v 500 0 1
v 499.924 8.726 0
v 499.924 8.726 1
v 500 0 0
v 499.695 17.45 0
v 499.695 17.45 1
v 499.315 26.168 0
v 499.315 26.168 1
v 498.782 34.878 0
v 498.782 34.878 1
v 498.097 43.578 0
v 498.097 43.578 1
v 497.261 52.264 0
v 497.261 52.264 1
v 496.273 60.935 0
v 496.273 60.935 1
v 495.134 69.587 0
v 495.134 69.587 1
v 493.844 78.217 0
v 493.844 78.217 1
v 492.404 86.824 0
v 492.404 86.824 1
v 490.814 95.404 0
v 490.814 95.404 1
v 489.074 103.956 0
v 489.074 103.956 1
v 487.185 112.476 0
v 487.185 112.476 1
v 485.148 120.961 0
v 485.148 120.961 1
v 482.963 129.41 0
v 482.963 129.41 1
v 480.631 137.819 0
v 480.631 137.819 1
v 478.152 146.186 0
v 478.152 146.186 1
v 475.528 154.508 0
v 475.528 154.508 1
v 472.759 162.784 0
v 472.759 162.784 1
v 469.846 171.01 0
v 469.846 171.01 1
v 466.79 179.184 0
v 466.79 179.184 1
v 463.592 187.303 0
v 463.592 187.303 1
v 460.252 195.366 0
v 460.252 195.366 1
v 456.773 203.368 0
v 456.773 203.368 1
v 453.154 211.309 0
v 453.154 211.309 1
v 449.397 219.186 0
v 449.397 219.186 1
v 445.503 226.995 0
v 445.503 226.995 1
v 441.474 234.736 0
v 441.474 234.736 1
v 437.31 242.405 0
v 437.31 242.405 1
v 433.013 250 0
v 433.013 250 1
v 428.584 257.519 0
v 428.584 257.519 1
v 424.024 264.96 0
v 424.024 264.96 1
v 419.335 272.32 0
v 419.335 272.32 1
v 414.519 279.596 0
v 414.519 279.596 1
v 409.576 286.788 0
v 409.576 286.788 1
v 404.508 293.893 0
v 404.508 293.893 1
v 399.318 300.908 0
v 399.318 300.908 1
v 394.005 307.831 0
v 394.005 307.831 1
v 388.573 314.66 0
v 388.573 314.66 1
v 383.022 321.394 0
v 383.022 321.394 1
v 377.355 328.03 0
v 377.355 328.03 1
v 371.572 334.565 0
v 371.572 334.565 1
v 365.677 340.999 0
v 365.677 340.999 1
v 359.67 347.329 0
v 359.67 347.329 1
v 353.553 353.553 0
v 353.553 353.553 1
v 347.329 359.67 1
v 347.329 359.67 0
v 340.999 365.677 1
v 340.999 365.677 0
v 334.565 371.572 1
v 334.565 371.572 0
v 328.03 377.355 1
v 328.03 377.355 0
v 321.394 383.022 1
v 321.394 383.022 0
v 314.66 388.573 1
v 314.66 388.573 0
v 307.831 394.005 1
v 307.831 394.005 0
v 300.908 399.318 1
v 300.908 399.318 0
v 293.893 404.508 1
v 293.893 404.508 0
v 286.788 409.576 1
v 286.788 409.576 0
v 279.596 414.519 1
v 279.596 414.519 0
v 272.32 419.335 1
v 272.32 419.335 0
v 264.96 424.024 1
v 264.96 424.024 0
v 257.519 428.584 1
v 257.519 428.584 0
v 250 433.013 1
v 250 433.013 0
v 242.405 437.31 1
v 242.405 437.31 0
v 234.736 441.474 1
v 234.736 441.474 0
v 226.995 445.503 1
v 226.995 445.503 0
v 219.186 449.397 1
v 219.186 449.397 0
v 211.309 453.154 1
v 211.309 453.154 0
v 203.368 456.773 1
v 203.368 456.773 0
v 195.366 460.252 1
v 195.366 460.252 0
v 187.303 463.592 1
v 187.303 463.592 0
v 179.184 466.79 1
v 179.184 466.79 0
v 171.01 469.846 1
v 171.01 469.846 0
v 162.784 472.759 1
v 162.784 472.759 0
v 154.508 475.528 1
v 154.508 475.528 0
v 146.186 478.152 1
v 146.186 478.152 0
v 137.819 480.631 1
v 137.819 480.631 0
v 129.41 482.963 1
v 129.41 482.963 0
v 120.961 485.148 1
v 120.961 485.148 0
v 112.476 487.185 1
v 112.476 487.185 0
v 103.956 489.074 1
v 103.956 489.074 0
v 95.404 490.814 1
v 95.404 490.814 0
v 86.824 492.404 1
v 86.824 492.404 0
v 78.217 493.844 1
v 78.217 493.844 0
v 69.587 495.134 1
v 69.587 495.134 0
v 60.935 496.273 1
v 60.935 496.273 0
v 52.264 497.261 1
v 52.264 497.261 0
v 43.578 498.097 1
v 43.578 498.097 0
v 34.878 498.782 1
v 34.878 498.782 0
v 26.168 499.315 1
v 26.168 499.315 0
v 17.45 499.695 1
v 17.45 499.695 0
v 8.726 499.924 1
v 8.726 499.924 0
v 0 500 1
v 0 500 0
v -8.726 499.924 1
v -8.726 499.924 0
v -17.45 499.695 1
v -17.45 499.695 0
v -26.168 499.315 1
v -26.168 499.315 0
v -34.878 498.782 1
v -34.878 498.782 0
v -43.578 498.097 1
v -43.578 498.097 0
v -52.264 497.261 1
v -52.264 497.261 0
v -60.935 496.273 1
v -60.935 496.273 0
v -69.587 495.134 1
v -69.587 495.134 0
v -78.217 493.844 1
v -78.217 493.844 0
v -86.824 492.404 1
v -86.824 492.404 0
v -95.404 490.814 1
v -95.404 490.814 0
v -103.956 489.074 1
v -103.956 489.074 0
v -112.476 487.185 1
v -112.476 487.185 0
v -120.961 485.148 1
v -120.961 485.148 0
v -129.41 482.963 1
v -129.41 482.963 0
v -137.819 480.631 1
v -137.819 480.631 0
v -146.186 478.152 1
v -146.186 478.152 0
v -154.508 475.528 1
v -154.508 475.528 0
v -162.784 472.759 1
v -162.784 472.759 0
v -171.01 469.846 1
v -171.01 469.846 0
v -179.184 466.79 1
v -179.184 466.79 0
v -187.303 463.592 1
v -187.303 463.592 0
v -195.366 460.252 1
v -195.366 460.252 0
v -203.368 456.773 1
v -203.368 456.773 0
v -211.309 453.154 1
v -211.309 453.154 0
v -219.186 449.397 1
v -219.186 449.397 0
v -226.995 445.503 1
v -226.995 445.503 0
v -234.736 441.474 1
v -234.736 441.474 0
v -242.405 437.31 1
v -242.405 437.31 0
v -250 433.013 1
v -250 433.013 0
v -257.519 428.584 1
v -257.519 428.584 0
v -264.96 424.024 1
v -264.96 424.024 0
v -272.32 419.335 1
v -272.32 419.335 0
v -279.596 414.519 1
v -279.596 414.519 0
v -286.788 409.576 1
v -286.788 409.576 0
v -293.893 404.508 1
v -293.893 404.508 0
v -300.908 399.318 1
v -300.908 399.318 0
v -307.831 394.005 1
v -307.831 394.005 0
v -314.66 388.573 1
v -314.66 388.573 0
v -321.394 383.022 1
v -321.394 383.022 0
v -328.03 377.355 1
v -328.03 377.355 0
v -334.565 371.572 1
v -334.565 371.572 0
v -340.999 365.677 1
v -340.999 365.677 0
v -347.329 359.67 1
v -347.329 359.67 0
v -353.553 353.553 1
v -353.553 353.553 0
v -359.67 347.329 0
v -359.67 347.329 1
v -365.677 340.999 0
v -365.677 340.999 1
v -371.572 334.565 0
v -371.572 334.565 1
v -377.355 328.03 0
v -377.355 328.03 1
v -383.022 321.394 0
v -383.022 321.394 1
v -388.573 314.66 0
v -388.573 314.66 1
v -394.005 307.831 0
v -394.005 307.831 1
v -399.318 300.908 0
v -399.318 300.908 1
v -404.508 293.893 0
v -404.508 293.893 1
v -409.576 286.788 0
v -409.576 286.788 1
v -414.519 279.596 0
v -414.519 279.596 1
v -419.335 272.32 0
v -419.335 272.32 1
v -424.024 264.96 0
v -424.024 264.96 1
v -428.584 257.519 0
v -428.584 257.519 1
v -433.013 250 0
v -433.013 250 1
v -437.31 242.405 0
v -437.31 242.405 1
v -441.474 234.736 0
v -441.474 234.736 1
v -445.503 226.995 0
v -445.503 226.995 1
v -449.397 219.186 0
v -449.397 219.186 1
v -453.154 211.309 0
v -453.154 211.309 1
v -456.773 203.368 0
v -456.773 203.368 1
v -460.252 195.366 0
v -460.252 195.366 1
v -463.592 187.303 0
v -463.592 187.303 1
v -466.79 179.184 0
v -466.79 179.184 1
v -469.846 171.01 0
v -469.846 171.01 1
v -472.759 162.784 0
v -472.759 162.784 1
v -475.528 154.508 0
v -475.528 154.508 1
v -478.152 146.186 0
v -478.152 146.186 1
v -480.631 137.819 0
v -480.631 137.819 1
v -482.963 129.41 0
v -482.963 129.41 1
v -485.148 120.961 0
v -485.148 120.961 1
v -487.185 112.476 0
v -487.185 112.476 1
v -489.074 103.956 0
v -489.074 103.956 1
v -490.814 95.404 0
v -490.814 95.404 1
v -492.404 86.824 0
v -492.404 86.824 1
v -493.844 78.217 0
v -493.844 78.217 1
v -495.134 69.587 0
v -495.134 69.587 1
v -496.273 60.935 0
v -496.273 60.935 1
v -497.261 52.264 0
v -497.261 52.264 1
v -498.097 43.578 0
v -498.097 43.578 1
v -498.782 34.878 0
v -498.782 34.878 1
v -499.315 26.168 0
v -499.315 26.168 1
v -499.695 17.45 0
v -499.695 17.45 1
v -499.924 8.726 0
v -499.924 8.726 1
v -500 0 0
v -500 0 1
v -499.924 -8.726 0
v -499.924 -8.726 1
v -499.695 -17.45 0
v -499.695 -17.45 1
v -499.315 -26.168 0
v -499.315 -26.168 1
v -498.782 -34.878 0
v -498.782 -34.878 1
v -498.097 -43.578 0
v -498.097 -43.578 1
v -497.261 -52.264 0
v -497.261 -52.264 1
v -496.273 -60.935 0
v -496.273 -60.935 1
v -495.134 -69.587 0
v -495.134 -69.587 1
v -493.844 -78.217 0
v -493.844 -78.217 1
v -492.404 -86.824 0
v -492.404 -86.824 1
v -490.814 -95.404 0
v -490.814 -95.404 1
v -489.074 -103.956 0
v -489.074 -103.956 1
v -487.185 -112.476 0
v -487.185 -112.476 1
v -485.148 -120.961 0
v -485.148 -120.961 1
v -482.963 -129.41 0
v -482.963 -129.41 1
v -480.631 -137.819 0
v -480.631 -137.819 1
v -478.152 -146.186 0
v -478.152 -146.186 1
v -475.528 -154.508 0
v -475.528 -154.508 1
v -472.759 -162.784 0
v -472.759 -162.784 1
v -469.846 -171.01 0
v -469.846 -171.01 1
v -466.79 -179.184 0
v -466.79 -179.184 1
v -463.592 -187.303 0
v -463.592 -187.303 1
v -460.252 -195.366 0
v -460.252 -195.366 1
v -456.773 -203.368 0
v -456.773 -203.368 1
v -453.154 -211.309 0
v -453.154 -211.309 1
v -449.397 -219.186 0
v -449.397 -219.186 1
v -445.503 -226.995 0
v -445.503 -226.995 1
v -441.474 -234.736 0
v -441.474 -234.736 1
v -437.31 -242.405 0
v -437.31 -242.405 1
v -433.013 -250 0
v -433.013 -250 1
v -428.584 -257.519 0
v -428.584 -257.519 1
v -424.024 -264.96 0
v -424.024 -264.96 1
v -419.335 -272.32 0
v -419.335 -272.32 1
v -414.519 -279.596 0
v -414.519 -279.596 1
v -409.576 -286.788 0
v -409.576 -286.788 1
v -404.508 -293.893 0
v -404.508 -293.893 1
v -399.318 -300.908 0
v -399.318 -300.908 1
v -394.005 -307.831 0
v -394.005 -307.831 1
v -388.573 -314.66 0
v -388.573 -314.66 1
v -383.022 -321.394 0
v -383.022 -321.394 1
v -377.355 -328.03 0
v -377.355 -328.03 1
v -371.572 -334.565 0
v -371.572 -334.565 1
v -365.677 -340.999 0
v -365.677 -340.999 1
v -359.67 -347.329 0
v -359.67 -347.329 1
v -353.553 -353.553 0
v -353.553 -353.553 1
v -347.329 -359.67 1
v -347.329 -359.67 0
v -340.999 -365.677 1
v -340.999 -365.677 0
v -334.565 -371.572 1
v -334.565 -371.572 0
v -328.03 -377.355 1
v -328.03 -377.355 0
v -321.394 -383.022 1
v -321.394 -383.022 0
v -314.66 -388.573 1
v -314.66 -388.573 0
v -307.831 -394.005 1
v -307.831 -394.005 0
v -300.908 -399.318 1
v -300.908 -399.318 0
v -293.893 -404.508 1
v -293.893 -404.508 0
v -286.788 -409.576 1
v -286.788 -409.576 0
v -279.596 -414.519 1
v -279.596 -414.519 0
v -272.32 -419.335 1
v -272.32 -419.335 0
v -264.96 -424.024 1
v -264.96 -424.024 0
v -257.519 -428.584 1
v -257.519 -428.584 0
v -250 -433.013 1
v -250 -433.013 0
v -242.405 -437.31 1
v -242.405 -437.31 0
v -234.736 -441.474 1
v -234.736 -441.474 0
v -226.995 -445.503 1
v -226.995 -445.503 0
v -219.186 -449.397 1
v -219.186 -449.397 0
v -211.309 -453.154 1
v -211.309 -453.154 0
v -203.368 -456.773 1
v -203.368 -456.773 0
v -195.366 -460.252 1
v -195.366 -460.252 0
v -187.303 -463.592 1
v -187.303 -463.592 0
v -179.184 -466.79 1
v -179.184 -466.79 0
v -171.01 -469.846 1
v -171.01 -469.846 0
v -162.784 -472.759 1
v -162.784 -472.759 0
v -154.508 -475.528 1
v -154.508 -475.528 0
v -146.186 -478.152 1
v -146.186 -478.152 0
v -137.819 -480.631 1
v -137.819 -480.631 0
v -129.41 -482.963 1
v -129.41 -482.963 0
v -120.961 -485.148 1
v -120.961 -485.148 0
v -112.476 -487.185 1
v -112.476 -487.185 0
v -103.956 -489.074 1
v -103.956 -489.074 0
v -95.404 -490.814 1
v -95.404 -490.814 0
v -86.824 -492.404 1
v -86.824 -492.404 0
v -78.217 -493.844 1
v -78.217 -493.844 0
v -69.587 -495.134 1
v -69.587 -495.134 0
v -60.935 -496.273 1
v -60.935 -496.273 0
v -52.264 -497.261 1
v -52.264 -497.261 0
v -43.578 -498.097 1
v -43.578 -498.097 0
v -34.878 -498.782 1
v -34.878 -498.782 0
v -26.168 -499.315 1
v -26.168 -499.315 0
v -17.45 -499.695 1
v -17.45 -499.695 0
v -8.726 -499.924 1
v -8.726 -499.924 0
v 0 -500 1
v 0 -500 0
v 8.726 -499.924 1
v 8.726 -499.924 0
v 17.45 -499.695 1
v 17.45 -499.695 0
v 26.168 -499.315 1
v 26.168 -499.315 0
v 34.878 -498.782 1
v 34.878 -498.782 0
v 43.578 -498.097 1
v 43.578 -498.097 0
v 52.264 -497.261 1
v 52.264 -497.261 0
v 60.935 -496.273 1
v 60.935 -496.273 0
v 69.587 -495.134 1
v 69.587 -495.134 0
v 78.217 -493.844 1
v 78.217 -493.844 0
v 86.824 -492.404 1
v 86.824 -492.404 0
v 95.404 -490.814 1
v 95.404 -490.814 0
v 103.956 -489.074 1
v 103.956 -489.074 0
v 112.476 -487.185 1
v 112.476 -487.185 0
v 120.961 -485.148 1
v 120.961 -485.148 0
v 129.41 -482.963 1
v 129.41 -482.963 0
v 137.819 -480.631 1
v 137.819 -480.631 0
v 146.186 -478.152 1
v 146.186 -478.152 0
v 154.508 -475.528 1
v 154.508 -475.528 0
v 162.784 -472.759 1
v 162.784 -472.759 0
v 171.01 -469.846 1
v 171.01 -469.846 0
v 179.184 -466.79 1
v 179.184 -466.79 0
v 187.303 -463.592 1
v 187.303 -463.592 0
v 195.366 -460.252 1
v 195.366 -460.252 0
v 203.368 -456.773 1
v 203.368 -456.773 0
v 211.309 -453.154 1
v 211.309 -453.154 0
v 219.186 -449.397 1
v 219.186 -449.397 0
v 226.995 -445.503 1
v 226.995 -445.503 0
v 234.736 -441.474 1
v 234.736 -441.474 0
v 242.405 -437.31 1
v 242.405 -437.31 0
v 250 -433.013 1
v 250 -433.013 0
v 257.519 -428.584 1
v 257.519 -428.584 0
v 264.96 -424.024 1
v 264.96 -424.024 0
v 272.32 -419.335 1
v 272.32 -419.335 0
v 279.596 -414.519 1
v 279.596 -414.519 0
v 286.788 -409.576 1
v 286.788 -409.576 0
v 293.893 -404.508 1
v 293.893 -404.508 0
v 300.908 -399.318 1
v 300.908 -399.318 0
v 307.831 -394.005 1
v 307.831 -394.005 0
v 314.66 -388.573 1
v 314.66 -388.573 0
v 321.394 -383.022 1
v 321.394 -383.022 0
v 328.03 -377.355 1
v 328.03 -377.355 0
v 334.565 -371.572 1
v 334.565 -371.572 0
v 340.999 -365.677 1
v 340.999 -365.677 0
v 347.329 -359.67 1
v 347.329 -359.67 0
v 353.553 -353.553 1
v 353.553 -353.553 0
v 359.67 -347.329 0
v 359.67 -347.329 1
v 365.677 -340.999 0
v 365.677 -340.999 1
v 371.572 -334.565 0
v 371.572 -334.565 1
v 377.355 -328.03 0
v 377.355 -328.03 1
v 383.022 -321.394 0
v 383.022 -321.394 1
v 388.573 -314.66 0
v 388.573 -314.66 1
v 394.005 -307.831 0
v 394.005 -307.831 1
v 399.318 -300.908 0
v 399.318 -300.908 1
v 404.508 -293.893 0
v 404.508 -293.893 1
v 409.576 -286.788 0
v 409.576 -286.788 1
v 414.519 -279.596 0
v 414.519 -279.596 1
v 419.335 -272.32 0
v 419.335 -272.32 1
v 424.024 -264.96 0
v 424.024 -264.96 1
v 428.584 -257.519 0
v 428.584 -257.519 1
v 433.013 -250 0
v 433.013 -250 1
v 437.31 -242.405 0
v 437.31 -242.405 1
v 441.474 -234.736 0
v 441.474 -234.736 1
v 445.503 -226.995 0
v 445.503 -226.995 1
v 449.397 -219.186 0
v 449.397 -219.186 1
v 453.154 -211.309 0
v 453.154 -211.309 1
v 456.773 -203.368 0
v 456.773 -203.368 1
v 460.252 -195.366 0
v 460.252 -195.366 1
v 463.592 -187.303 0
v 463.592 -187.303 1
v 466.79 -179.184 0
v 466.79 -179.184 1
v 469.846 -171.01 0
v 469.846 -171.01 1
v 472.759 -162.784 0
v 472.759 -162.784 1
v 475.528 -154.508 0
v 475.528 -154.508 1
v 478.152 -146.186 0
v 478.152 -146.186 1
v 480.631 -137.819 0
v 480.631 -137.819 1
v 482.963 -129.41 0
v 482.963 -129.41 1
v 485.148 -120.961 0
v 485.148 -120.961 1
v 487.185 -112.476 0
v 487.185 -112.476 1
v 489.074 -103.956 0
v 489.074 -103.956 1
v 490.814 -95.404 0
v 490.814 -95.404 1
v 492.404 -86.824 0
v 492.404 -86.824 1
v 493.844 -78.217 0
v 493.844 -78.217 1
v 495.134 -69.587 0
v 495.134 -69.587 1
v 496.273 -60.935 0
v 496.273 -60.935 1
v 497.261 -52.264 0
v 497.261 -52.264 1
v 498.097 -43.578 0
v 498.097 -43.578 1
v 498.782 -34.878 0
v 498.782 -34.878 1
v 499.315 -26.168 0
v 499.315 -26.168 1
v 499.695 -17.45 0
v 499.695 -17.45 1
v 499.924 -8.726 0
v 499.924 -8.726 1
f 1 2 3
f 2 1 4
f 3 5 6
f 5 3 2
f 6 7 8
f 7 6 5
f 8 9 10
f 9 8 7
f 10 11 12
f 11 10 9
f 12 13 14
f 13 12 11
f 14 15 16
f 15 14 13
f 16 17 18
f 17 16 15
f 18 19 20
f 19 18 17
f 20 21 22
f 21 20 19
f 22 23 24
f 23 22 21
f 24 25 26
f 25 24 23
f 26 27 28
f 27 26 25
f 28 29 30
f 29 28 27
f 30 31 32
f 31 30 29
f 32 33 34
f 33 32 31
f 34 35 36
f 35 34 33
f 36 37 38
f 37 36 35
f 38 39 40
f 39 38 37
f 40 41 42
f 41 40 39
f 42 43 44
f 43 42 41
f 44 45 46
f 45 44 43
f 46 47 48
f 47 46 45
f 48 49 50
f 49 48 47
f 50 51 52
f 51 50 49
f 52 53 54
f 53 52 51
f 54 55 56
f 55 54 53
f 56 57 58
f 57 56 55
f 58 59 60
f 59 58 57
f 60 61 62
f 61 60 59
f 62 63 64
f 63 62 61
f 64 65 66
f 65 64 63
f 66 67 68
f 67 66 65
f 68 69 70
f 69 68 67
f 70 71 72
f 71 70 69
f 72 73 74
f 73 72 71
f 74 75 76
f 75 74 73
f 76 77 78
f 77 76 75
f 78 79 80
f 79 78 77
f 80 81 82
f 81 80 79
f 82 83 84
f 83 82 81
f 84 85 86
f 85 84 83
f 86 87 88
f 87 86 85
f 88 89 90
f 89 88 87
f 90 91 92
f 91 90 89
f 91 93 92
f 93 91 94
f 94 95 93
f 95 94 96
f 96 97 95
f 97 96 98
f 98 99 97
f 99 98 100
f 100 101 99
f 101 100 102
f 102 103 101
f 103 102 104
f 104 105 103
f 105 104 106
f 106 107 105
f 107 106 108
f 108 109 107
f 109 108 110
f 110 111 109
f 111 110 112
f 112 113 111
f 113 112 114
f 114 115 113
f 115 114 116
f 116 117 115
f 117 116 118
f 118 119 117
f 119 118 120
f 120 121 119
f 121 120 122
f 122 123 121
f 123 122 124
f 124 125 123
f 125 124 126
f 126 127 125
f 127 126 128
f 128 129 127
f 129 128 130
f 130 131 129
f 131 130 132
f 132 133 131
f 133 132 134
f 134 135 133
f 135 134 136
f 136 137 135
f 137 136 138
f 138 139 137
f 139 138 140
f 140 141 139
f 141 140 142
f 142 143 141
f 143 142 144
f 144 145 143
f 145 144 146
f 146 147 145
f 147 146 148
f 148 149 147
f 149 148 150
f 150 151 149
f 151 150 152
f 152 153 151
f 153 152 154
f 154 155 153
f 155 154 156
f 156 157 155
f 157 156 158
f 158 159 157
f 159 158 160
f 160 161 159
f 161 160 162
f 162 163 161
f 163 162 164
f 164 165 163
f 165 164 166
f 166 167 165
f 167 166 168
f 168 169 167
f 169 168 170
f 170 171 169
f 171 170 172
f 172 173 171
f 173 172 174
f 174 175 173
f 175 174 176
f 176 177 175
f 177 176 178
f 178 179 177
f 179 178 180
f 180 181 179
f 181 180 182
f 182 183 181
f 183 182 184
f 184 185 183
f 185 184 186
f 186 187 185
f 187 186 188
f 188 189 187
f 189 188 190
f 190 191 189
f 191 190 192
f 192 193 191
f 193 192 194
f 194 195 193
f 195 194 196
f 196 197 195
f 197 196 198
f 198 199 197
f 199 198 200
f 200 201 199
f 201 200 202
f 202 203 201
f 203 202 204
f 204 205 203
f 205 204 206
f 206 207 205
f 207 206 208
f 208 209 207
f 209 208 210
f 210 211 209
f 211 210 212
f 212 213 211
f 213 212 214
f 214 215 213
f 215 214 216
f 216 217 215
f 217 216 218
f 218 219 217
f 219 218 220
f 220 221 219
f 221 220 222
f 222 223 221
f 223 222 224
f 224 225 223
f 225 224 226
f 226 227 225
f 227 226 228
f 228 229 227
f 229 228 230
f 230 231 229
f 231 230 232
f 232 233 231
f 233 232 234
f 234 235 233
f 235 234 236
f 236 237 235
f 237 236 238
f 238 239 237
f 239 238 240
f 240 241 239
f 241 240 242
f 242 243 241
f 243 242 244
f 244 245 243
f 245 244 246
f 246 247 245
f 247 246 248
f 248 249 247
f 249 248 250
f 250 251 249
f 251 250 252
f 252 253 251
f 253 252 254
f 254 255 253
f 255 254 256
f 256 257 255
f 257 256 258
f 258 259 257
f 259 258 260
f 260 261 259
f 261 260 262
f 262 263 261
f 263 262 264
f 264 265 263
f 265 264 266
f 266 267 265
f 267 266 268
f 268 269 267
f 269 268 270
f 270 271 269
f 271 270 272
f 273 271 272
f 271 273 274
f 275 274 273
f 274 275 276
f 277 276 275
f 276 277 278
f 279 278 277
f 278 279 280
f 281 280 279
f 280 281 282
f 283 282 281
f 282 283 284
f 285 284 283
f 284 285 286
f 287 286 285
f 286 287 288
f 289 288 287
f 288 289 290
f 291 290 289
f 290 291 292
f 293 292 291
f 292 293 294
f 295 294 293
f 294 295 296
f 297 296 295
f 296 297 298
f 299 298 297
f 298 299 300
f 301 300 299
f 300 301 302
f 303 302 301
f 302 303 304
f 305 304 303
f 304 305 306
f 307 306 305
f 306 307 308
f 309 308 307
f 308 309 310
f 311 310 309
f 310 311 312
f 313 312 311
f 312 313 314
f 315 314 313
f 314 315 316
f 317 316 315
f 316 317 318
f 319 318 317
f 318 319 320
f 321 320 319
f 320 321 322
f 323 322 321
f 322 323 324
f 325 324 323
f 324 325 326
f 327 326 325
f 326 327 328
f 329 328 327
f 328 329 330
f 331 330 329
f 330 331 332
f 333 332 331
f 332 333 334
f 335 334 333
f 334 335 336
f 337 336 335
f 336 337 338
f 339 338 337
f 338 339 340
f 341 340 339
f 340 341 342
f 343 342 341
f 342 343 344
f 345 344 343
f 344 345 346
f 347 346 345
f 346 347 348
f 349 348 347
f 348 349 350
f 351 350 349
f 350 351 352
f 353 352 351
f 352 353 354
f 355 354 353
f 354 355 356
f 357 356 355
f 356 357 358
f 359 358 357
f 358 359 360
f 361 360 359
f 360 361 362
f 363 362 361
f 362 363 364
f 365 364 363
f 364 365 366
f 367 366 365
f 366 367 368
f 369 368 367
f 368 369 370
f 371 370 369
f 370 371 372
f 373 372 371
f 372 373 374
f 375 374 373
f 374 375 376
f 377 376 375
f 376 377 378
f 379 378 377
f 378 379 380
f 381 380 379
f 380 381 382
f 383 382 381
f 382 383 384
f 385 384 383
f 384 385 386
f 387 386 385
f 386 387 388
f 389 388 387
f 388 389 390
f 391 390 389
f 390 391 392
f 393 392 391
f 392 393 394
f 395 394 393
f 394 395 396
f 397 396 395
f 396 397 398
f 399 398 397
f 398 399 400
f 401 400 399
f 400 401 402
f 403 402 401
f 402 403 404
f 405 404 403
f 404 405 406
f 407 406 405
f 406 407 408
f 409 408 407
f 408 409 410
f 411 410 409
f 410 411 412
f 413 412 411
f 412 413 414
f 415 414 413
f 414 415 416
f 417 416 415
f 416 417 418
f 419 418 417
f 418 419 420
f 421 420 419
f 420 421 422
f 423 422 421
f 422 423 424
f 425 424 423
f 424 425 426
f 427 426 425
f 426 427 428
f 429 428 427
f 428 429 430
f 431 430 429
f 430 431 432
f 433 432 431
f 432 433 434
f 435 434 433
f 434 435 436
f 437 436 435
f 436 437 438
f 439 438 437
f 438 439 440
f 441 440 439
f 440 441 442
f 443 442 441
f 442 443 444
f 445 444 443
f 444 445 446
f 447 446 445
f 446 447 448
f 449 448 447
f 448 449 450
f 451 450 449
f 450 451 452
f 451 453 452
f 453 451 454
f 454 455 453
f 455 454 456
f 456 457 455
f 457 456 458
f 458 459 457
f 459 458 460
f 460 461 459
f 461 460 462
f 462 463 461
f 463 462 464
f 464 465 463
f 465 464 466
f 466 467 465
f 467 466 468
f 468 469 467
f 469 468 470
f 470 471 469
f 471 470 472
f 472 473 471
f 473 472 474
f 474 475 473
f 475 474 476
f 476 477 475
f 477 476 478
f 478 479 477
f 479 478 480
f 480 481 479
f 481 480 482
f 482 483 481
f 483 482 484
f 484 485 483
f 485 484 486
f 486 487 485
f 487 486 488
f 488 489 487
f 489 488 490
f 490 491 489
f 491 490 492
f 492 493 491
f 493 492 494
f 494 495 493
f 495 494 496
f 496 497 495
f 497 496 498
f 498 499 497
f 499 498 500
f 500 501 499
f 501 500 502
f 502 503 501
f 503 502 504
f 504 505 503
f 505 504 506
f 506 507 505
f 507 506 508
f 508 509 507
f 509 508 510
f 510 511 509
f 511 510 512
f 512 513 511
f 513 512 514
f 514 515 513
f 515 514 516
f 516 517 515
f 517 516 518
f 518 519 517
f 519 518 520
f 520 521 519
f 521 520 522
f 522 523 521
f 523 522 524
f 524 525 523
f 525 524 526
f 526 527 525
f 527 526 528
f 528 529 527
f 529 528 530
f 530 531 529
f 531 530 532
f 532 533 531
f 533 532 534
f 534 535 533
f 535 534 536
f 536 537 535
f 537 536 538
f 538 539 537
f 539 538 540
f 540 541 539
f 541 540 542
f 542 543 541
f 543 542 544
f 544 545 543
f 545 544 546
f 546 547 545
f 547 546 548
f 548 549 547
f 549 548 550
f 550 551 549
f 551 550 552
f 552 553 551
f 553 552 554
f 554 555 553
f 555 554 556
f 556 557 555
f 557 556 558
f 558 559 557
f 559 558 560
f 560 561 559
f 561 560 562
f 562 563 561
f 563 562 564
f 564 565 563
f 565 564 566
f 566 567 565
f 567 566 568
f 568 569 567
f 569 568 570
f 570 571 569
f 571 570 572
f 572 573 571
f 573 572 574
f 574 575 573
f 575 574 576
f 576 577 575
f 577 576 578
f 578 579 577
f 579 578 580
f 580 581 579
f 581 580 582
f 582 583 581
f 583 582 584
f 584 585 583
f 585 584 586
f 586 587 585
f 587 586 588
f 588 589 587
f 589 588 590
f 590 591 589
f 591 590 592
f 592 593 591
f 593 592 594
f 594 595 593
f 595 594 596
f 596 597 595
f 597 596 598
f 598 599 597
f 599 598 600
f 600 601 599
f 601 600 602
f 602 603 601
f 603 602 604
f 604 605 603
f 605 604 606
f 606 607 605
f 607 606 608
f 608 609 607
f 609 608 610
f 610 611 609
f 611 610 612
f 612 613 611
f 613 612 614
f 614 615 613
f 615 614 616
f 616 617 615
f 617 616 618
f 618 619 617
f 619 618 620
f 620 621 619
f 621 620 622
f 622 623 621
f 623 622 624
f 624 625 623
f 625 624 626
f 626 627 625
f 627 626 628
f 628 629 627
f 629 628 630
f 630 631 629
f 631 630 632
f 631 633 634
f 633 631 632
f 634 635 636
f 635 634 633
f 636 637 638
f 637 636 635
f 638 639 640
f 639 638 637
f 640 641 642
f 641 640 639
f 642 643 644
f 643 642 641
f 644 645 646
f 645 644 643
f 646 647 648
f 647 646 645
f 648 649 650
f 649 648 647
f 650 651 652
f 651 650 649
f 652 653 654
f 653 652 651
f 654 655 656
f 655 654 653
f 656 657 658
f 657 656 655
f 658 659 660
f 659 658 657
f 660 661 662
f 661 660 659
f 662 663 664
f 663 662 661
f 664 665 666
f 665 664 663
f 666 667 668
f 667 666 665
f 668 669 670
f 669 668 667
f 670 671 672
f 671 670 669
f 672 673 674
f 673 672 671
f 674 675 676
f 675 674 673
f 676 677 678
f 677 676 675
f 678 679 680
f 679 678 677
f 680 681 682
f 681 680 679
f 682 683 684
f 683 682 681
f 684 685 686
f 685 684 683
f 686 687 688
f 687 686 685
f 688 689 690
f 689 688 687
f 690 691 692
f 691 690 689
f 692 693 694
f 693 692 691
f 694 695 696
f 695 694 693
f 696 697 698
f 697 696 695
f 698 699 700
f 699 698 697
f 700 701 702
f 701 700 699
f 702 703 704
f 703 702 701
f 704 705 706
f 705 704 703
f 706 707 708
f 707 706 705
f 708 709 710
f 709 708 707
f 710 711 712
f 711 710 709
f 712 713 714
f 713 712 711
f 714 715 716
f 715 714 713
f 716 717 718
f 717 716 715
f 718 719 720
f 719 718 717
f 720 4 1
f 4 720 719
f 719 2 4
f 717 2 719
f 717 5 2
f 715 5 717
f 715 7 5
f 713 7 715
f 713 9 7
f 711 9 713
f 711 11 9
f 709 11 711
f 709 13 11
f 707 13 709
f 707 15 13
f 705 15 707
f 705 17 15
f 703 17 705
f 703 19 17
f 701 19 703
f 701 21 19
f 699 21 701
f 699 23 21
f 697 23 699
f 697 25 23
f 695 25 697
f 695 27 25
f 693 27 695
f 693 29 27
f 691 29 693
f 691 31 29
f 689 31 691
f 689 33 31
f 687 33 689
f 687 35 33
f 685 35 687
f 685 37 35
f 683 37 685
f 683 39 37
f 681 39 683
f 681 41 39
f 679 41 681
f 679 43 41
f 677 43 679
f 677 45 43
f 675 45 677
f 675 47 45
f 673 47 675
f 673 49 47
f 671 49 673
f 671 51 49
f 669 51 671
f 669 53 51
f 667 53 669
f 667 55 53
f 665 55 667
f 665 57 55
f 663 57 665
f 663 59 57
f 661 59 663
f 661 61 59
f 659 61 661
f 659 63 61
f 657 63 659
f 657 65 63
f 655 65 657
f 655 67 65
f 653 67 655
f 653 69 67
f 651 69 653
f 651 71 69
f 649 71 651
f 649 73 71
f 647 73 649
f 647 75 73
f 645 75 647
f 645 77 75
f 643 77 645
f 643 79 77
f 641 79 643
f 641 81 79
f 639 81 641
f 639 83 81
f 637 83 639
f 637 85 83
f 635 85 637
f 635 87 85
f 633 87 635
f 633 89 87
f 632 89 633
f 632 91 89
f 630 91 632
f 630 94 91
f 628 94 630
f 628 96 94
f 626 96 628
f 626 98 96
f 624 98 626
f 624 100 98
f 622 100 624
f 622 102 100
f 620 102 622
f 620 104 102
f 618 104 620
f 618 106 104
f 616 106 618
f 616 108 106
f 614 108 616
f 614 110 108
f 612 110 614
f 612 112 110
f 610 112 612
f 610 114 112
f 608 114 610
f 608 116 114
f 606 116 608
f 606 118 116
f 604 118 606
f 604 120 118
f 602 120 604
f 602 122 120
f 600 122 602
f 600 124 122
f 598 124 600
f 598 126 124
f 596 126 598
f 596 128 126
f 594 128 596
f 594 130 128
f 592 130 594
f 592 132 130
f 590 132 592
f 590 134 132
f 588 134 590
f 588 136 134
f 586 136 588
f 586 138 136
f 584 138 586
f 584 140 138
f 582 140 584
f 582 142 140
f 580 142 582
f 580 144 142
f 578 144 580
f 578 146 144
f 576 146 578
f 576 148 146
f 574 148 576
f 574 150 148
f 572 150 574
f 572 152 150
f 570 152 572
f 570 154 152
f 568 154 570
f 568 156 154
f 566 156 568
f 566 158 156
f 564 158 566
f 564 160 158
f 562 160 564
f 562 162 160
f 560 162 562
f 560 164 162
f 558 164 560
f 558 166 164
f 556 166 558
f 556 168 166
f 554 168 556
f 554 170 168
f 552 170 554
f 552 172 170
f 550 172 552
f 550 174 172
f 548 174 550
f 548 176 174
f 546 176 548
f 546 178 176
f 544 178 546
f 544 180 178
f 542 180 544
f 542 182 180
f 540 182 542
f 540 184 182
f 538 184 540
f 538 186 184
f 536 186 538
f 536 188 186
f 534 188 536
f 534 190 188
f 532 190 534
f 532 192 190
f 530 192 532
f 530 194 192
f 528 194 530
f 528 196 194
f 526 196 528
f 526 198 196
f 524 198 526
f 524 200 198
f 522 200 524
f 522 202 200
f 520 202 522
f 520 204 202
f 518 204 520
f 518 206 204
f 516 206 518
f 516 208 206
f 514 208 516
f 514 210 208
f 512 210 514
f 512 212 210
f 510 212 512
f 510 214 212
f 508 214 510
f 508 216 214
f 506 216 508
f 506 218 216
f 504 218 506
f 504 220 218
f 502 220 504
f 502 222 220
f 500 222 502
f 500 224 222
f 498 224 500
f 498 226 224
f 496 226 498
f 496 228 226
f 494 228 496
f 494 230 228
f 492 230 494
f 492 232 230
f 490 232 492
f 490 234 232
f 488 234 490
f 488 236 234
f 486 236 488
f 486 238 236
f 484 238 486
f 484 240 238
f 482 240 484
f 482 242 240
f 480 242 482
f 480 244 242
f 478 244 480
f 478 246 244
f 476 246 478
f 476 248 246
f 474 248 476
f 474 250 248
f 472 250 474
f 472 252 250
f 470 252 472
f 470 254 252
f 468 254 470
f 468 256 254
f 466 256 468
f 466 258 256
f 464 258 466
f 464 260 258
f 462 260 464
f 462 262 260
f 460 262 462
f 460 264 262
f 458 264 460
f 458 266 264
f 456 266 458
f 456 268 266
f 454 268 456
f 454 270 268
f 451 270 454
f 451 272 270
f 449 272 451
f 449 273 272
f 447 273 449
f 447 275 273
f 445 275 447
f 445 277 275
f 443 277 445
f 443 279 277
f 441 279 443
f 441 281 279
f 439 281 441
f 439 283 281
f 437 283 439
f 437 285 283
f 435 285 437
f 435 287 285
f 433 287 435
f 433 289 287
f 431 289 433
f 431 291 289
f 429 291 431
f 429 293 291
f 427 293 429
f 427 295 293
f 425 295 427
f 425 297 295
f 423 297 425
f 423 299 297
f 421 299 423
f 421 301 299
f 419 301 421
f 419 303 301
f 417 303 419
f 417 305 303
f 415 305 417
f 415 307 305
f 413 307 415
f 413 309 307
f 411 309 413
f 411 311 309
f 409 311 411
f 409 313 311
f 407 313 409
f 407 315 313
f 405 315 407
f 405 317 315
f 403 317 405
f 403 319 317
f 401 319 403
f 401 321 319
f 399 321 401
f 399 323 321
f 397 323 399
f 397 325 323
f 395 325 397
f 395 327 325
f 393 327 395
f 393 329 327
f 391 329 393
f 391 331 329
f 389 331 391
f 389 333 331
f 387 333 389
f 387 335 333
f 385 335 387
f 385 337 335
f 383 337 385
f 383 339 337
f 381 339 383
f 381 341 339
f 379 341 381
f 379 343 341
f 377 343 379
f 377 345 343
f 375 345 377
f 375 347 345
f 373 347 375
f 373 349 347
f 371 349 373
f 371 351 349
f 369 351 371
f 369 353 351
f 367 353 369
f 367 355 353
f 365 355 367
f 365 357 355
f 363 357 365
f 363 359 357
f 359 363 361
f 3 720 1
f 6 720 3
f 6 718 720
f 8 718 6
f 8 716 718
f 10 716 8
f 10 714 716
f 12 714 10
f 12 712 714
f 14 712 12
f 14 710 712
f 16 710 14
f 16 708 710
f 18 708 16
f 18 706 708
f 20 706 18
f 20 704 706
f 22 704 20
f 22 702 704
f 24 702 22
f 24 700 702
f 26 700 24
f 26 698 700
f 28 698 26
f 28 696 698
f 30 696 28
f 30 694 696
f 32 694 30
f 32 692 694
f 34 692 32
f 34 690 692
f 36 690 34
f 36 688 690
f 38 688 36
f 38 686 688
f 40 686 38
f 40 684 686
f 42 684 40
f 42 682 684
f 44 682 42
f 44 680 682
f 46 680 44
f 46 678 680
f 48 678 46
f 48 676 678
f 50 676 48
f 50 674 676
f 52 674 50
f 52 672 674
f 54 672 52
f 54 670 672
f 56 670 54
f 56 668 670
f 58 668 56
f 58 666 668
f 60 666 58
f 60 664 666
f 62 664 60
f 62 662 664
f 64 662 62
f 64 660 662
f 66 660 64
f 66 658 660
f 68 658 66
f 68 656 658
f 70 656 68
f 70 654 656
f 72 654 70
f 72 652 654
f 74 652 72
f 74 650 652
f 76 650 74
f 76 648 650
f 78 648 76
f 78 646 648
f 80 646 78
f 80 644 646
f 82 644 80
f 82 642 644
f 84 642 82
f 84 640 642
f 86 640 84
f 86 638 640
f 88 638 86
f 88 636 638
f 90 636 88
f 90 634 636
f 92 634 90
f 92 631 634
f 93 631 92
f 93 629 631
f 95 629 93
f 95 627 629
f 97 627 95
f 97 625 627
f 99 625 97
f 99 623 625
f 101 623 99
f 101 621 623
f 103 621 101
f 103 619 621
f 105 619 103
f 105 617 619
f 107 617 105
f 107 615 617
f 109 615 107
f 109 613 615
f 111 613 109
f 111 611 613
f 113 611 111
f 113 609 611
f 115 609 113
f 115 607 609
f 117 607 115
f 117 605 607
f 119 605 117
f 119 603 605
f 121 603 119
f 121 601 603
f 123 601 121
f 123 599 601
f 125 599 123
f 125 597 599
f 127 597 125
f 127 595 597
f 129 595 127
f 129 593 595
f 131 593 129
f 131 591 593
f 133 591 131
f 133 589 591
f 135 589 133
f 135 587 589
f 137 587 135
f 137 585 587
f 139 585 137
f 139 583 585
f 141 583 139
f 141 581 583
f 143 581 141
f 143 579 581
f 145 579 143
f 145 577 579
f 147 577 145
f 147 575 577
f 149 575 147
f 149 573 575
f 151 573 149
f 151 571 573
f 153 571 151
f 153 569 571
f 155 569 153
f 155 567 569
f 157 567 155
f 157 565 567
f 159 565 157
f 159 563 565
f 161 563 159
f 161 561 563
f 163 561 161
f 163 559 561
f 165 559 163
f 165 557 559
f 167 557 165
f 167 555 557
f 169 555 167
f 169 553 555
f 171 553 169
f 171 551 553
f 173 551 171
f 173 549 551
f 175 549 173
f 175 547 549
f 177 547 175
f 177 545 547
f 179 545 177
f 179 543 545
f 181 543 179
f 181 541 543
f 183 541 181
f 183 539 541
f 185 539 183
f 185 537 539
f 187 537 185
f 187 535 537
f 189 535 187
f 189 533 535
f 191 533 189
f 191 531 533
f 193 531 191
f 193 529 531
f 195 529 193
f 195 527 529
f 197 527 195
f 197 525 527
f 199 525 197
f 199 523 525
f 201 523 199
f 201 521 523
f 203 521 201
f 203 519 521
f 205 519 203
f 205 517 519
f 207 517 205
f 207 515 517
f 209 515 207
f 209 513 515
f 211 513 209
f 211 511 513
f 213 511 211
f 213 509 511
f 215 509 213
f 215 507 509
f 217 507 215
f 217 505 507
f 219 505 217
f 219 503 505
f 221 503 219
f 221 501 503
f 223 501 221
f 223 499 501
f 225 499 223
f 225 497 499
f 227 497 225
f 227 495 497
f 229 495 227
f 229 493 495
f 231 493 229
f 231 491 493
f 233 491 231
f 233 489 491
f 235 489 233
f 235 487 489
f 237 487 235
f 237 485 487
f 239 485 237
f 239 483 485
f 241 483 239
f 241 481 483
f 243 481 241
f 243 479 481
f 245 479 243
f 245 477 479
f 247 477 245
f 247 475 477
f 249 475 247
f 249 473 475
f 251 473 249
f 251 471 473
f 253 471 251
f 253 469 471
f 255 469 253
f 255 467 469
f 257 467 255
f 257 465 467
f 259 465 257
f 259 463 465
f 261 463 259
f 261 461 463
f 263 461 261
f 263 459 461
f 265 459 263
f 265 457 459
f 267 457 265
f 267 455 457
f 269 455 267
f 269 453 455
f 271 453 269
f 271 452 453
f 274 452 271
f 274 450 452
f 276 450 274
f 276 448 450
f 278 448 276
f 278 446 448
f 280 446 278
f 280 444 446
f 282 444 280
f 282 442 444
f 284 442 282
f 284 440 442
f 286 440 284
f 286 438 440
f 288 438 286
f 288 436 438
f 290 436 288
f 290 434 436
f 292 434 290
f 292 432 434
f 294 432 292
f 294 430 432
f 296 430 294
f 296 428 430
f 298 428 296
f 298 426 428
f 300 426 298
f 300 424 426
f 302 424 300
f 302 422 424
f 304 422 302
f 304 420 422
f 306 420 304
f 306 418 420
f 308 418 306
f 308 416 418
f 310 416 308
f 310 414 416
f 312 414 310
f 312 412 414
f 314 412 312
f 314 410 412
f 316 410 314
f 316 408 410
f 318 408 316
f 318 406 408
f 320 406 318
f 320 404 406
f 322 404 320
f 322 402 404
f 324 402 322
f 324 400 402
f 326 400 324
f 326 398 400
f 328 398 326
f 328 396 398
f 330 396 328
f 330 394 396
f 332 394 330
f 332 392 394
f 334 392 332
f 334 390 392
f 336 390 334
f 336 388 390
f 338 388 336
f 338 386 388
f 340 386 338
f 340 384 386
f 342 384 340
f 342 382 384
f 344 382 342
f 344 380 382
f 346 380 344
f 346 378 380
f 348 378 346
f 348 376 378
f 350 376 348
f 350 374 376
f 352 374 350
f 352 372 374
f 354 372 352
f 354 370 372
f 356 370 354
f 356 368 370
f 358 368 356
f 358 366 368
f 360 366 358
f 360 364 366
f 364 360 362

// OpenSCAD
// large radius, fragments from $fa
cylinder(h = 1, r = 500, $fa = 1);
